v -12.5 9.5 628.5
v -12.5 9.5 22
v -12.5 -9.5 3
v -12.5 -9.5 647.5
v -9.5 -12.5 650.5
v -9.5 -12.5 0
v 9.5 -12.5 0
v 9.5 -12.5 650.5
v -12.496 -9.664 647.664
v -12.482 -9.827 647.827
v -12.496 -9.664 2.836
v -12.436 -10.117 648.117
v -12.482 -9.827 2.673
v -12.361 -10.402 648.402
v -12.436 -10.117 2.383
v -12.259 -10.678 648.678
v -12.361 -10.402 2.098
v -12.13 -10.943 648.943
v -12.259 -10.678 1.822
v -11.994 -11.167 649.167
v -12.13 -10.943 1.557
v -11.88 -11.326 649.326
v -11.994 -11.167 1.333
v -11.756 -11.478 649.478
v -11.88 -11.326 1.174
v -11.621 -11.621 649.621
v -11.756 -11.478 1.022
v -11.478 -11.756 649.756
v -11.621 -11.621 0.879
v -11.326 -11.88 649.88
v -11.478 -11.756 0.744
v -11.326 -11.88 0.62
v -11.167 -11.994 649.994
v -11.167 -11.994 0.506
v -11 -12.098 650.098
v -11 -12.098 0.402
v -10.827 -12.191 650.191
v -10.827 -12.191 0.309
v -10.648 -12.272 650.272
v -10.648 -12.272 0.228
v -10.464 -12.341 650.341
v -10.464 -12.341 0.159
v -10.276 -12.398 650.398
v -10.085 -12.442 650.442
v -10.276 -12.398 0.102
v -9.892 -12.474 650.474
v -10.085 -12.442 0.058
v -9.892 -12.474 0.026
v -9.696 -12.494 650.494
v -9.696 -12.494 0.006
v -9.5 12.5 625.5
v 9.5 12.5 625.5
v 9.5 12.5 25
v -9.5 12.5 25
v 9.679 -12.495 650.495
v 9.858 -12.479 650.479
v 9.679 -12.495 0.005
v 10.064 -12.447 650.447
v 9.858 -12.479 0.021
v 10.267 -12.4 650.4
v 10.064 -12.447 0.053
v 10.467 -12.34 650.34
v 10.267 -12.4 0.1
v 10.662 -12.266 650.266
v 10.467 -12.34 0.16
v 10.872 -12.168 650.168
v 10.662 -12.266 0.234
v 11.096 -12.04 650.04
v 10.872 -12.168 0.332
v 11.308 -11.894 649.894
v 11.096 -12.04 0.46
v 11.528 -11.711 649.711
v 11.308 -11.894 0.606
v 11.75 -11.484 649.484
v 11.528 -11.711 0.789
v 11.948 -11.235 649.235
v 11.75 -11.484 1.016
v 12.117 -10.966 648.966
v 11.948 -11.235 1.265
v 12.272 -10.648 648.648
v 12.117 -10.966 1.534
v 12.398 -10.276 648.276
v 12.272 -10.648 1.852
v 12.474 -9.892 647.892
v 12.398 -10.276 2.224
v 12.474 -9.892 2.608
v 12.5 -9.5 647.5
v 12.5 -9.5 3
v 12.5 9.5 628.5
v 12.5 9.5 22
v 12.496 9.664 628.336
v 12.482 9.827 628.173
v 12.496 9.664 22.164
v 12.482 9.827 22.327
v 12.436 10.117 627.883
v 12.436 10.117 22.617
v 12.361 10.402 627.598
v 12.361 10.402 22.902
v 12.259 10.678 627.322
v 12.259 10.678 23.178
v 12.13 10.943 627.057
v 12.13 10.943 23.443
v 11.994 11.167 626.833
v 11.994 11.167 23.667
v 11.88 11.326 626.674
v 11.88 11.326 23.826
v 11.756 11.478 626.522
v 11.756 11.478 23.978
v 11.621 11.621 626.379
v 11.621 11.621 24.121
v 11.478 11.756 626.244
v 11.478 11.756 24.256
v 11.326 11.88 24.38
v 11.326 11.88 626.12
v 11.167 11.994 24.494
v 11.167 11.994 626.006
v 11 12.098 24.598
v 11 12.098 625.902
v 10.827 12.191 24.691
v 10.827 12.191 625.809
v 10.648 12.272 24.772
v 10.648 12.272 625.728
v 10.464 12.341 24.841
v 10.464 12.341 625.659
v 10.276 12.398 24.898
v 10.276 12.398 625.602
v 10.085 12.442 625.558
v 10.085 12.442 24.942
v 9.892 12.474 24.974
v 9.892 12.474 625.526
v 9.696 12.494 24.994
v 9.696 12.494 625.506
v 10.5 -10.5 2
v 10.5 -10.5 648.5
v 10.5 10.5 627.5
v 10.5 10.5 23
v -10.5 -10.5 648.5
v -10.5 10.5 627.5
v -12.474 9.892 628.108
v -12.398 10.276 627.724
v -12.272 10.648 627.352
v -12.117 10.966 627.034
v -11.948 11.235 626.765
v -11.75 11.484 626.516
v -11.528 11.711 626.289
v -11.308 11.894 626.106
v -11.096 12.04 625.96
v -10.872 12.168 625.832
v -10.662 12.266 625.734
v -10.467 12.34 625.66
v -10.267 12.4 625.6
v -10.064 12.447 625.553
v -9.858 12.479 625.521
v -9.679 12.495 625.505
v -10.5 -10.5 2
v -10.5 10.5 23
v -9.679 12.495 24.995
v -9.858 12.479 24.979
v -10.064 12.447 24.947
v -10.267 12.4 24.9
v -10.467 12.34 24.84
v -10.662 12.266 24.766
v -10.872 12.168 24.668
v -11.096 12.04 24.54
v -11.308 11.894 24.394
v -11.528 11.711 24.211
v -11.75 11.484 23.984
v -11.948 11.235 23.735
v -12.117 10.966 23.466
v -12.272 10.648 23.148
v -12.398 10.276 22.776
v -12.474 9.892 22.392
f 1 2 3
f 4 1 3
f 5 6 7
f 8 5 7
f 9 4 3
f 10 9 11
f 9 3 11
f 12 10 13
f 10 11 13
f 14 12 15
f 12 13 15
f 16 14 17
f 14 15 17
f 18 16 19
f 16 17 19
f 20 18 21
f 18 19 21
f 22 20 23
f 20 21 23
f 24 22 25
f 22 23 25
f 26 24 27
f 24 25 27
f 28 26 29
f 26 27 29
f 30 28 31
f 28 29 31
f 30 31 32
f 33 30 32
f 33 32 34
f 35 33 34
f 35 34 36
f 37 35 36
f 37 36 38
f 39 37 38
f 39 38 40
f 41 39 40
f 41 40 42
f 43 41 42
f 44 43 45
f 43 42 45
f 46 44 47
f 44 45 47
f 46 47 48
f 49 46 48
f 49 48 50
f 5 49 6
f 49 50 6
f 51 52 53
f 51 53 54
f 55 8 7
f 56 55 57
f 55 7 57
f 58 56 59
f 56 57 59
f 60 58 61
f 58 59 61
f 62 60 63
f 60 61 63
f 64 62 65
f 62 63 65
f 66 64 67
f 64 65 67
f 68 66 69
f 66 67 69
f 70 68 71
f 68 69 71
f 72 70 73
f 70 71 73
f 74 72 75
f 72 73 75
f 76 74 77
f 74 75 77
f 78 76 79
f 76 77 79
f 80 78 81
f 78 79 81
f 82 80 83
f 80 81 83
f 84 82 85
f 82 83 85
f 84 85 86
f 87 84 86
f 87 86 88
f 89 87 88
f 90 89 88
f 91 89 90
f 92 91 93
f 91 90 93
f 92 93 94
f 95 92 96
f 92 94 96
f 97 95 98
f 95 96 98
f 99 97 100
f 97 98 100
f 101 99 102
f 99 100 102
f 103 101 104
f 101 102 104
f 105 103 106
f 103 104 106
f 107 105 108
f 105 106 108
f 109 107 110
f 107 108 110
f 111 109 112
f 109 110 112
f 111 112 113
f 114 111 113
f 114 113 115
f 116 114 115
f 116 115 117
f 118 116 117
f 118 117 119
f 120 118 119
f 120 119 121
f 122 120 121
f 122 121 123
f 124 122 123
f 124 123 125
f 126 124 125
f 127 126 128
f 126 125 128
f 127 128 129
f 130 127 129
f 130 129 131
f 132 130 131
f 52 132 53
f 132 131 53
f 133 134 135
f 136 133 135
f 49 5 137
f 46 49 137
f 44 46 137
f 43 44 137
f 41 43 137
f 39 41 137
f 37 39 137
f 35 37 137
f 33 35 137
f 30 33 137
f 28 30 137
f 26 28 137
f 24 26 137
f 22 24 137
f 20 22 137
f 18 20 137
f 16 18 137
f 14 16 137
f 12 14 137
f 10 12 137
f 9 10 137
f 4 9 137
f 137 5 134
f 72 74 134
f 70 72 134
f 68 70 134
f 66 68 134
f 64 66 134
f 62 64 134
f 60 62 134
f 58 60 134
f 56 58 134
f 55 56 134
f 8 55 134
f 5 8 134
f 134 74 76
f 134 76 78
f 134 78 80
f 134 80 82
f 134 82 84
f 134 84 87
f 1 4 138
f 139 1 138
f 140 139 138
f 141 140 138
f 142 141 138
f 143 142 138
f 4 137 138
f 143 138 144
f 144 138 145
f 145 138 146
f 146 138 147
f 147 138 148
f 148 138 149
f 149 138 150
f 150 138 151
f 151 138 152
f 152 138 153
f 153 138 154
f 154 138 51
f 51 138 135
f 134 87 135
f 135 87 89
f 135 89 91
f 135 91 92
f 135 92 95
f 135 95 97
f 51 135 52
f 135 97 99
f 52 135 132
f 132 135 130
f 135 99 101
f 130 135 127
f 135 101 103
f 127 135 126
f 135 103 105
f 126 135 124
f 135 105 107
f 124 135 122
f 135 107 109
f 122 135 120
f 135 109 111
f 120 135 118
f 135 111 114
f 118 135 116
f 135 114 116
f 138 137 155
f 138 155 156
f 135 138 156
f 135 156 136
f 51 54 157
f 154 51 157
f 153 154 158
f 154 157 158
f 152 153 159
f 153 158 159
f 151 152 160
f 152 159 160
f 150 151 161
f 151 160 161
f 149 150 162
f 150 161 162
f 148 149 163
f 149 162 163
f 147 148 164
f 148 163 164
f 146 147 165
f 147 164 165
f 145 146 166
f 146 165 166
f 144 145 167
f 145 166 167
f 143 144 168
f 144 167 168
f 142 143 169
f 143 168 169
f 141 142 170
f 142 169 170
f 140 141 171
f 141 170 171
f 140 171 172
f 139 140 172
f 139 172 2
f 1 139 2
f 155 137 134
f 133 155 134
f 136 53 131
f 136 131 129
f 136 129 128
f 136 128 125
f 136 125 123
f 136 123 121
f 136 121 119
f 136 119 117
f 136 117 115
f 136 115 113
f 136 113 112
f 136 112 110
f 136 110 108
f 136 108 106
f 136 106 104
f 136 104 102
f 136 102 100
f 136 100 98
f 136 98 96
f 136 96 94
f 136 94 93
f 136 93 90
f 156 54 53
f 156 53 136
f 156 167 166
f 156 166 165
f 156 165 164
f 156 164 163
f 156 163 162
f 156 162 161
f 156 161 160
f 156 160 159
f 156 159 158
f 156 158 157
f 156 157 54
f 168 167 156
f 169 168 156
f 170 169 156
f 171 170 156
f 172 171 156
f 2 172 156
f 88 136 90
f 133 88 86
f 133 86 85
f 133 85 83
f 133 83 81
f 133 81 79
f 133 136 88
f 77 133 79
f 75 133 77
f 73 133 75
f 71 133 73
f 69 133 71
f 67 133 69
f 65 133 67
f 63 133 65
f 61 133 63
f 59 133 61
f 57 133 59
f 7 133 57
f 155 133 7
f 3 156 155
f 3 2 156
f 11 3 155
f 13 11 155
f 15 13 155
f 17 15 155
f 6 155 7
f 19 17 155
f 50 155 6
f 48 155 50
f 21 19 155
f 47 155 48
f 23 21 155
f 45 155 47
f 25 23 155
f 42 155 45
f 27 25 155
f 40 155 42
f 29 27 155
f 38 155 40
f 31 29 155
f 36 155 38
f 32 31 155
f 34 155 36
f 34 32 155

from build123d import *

# Parameters (mm, degrees)
F0_W     = 21
F0_H     = 21
F1_DEPTH = 680
F3_DEPTH = 12.5


with BuildPart() as f1:
    # F0 (on Top) → F1 (new body)
    with BuildSketch(Plane.XY):
        with BuildLine():
            ThreePointArc((12.5, 9.5), (11.62132, 11.62132), (9.5, 12.5))
            Line((9.5, 12.5), (-9.5, 12.5))
            ThreePointArc((-9.5, 12.5), (-11.62132, 11.62132), (-12.5, 9.5))
            Line((-12.5, 9.5), (-12.5, -9.5))
            ThreePointArc((-12.5, -9.5), (-11.62132, -11.62132), (-9.5, -12.5))
            Line((-9.5, -12.5), (9.5, -12.5))
            ThreePointArc((9.5, -12.5), (11.62132, -11.62132), (12.5, -9.5))
            Line((12.5, -9.5), (12.5, 9.5))
        make_face()
        Rectangle(F0_W, F0_H, mode=Mode.SUBTRACT)
    extrude(amount=F1_DEPTH)

    # F2 (on Right) → F3 (cut, symmetric)
    with BuildSketch(Plane.YZ):
        Polygon((12.5, 25), (-12.5, 0), (12.5, 0), align=None)
        Polygon((-12.5, 650.5), (12.5, 625.5), (12.5, 680), (-12.5, 680), align=None)
    extrude(amount=F3_DEPTH, both=True, mode=Mode.SUBTRACT)


solid = f1.part
